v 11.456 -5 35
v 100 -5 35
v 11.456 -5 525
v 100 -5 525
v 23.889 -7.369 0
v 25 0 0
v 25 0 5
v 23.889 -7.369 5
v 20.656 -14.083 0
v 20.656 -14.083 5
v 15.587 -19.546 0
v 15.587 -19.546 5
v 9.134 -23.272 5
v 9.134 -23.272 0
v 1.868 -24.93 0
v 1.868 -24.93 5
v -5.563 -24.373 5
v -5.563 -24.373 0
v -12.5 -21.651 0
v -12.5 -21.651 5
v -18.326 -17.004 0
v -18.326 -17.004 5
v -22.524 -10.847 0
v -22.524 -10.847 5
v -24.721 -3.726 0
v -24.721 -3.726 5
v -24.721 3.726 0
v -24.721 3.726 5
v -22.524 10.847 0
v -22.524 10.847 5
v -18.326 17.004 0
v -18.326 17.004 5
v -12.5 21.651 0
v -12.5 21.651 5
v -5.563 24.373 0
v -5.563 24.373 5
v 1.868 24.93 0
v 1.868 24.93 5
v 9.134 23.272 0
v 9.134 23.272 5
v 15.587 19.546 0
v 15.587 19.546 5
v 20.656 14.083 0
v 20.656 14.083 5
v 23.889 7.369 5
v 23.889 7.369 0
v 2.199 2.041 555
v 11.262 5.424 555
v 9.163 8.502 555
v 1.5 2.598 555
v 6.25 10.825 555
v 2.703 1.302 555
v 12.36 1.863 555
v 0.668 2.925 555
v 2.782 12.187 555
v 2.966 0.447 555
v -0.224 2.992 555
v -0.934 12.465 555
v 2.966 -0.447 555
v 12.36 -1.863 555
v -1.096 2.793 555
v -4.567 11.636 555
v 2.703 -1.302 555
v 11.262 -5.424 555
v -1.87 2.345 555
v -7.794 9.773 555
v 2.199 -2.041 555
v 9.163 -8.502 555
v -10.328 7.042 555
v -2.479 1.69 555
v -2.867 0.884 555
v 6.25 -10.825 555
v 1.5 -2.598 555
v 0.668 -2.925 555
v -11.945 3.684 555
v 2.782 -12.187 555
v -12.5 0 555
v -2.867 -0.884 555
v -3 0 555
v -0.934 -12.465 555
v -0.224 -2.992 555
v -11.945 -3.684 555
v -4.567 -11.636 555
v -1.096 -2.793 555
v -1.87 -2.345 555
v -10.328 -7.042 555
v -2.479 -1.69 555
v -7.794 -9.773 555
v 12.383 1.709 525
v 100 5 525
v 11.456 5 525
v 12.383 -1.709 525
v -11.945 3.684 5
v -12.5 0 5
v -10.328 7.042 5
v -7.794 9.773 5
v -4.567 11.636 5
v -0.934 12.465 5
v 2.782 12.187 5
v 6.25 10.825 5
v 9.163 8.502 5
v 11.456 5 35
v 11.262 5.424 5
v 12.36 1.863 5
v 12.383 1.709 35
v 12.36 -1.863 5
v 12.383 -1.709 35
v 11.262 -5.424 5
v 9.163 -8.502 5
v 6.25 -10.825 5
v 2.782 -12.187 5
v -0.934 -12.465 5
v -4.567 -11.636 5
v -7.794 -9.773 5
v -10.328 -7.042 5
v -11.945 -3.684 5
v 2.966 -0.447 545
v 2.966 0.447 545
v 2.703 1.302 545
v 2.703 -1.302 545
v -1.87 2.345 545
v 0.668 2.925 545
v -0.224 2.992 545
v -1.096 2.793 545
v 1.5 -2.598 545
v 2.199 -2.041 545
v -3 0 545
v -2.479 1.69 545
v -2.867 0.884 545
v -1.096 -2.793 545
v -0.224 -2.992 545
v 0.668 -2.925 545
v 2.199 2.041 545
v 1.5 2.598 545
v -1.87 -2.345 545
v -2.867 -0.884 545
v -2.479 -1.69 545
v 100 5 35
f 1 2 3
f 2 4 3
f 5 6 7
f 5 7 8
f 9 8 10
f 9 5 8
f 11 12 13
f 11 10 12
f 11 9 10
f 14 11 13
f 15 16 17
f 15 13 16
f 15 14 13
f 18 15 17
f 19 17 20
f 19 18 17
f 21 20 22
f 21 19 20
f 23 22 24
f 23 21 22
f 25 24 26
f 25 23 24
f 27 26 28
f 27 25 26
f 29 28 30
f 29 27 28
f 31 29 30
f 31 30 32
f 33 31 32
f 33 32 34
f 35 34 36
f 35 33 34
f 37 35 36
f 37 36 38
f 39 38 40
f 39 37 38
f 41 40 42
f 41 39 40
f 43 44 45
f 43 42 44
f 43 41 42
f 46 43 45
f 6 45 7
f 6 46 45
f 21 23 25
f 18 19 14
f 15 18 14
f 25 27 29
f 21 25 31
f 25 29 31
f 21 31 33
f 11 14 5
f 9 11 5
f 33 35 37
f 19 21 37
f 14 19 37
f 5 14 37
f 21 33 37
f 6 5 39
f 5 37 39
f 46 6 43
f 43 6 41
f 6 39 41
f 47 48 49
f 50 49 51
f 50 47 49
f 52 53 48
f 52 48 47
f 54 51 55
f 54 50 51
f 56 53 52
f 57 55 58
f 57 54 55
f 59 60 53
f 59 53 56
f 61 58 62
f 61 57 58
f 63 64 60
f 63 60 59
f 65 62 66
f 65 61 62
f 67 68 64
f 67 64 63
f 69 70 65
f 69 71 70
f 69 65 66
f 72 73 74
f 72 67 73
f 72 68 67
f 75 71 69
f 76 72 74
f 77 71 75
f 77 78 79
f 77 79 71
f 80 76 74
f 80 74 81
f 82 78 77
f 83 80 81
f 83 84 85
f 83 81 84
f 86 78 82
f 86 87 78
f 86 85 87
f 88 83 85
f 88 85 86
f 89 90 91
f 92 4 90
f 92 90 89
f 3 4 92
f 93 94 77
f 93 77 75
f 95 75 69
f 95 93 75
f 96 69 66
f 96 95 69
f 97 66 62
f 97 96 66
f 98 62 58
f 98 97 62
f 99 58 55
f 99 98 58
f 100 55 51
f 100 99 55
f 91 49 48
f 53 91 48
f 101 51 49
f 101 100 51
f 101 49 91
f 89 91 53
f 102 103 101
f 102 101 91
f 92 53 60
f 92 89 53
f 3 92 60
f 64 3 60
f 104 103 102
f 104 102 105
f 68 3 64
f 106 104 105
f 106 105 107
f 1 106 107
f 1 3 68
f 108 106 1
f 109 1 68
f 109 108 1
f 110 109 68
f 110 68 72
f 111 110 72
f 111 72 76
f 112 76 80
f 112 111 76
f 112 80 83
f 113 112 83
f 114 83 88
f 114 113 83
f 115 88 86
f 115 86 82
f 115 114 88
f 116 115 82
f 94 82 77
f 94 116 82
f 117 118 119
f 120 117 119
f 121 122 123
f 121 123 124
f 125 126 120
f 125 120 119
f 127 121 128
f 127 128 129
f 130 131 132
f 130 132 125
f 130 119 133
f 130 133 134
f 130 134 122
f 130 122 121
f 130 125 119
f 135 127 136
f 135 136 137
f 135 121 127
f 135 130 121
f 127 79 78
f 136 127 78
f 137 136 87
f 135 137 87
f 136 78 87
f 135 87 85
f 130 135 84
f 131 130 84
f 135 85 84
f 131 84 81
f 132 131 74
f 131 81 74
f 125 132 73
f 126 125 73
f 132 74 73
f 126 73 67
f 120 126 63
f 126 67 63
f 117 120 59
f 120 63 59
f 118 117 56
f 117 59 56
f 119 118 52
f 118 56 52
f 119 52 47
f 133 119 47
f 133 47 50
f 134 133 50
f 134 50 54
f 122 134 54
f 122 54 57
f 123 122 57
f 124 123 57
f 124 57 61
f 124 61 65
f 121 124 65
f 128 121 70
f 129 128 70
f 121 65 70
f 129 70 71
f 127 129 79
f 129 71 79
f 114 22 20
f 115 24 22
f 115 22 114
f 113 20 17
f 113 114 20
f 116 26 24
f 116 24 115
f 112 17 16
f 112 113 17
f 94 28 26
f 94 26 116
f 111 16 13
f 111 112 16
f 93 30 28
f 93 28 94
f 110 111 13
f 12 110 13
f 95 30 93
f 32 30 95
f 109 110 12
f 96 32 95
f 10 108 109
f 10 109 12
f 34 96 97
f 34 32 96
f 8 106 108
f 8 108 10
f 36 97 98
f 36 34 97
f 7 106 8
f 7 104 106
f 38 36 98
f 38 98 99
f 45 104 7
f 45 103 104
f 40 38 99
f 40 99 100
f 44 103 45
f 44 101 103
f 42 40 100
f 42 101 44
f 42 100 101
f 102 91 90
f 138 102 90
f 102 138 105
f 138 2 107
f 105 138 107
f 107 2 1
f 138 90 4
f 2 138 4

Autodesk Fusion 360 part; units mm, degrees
sketch "Sketch1" plane through (0, 0, 0) normal (0, 0, 1) x (1, 0, 0)
  circle A0 centre (0, 0) radius 25
  dimension "d1" = 50
extrude "Extrude1" add sketch "Sketch1" along normal blind 5
sketch "Sketch2" plane through (0, 0, 5) normal (0, 0, 1) x (-1, 0, 0)
  circle A0 centre (0, 0) radius 25
  circle A1 centre (0, 0) radius 12.5
  dimension "d4" = 25
extrude "Extrude2" add sketch "Sketch2" along normal blind 550 contours A1
sketch "Sketch3" plane through (0, 0, 555) normal (0, 0, 1) x (-1, 0, 0)
  circle A0 centre (0, 0) radius 12.5
  line L0 (0, -5) -> (-100, -5)
  line L1 (-100, -5) -> (-100, 5)
  line L2 (-100, 5) -> (0, 5)
  line L3 (0, 5) -> (0, -5)
  dimension "d7" = 100
  dimension "d8" = 10
extrude "Extrude3" add sketch "Sketch3" against normal blind 525 contours A0 L0 L1 L2
extrude "Extrude4" cut sketch "Sketch3" against normal blind 25 contours A0 L0 L1 L2
sketch "Sketch4" plane through (0, 0, 555) normal (0, 0, 1) x (-1, 0, 0)
  circle A0 centre (0, 0) radius 12.5
  circle A1 centre (0, 0) radius 3
  dimension "d13" = 6
extrude "Extrude5" cut sketch "Sketch4" against normal blind 10 contours A1
extrude "Extrude6" cut 1 faces at (70.8333, 0, 530) along direction (0, 0, -1) blind 5
extrude "Extrude7" cut 1 faces at (70.8333, 0, 30) along direction (0, 0, 1) blind 5
